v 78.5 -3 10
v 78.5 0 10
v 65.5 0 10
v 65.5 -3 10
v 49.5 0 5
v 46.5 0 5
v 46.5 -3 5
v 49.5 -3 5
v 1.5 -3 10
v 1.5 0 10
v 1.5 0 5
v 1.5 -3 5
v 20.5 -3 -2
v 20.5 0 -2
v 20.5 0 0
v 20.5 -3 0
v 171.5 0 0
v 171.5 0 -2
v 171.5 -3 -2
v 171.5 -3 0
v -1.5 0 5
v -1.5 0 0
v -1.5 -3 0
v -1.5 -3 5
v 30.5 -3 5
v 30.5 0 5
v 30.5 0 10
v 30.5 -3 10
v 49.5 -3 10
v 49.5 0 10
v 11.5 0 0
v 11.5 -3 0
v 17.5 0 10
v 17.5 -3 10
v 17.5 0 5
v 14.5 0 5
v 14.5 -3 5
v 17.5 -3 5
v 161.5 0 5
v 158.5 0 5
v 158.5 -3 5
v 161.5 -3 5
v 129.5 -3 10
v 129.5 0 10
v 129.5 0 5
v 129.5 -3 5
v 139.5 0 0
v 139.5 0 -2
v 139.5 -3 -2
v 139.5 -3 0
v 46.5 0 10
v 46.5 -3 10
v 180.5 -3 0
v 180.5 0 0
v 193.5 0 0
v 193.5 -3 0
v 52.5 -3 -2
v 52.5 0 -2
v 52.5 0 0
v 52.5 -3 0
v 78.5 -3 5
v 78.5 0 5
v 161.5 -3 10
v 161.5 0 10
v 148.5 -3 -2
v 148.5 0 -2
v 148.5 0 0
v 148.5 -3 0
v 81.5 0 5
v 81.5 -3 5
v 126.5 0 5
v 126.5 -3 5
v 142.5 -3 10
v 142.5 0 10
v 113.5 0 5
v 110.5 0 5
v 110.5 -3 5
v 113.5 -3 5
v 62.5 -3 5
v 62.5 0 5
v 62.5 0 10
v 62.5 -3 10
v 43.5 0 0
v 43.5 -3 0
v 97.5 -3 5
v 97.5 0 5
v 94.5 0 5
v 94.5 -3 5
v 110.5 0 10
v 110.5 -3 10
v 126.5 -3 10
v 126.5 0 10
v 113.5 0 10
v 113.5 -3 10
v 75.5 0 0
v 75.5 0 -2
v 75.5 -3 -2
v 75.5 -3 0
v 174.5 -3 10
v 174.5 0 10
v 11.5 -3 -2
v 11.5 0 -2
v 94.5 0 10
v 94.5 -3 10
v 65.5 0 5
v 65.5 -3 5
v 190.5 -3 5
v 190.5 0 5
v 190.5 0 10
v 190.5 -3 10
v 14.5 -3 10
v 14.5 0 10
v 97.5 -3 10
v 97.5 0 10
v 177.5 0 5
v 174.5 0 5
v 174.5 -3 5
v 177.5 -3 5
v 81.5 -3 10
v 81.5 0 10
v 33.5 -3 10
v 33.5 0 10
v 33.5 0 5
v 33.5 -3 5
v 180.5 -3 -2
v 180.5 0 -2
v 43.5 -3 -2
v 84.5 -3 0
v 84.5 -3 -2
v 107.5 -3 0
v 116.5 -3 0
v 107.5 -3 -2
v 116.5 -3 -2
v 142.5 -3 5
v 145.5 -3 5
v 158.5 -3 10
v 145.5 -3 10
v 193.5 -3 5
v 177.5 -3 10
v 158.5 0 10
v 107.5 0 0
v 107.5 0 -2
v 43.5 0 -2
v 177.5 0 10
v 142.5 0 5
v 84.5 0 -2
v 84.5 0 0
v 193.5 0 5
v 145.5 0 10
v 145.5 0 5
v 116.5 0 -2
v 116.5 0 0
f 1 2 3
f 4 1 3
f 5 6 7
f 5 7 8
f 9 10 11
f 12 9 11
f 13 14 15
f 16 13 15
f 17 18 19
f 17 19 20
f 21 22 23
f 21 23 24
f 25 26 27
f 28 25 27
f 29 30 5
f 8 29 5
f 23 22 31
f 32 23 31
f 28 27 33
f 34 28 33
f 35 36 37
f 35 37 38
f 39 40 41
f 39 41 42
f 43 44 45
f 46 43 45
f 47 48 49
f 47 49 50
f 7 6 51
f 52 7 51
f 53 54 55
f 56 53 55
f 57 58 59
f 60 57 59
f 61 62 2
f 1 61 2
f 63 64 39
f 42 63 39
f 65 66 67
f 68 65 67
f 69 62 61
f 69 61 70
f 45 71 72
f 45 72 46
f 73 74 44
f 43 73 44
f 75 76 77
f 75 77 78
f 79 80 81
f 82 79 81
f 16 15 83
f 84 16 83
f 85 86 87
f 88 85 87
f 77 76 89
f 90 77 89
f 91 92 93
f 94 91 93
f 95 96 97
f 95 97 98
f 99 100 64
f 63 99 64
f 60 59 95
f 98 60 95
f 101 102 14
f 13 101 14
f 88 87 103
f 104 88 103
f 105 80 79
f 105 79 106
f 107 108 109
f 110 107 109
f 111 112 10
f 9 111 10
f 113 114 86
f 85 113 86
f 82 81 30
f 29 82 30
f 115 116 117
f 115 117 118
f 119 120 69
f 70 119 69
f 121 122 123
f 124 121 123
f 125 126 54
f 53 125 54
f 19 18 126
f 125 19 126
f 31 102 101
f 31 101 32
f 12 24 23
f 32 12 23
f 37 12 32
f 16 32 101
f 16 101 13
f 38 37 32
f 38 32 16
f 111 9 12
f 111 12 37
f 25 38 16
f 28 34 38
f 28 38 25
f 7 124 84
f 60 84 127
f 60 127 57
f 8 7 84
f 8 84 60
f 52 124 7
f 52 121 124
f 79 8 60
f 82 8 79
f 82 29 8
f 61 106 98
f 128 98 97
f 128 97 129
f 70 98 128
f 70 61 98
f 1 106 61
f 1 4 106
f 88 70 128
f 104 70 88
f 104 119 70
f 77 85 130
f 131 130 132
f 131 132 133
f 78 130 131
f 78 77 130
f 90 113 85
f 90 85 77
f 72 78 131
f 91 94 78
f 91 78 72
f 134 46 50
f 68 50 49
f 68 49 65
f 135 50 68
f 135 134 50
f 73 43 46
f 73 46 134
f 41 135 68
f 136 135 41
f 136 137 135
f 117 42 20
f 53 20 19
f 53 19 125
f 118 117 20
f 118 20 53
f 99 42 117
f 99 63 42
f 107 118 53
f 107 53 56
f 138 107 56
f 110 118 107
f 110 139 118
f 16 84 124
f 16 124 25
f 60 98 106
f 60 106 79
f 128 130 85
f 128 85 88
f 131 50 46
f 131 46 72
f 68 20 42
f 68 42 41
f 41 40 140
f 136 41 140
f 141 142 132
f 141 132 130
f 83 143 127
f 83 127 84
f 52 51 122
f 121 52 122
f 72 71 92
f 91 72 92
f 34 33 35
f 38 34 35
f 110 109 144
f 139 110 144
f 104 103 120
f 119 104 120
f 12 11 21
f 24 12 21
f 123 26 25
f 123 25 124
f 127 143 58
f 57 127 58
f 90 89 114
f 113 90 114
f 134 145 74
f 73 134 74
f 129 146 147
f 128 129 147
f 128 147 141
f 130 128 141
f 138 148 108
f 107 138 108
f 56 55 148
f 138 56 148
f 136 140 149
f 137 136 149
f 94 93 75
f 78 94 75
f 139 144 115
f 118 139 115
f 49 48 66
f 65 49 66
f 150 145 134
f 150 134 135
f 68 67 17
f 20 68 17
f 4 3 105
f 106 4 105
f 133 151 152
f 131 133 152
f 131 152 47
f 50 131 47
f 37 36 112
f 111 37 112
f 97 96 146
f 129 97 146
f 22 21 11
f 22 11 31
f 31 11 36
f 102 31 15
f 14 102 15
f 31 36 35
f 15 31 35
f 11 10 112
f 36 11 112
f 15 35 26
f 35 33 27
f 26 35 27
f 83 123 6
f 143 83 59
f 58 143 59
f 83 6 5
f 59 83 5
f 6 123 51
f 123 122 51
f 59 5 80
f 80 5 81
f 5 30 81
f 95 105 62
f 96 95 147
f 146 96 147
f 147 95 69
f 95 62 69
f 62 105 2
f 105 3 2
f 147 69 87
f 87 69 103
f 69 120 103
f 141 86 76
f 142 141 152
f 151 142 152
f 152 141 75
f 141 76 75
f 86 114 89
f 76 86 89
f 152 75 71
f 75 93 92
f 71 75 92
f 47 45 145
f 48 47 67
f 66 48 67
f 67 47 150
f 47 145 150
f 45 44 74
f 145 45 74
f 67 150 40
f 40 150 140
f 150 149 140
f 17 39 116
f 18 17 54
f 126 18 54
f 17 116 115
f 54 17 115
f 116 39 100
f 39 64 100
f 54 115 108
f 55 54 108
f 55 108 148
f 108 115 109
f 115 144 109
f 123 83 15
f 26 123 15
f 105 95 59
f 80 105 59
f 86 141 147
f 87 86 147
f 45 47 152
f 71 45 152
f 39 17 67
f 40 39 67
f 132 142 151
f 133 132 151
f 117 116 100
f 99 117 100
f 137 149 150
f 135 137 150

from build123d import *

# Parameters (mm, degrees)
F0_W     = 3
F0_H     = 2
F0_W_2   = 1.5
F0_H_2   = 5
F1_DEPTH = 3


with BuildPart() as f1:
    # F0 (on Front) → F1 (new body)
    with BuildSketch(Plane.XZ):
        Polygon((1.5, 5), (1.5, 0), (11.5, 0), (14.5, 0), (14.5, 5), (14.5, 10), (11.5, 10), (1.5, 10), align=None)
        Polygon((17.5, 5), (17.5, 0), (20.5, 0), (30.5, 0), (30.5, 5), (30.5, 10), (20.5, 10), (17.5, 10), align=None)
        with Locations((45, -1)):
            Rectangle(F0_W, F0_H)
        with Locations((51, -1)):
            Rectangle(F0_W, F0_H)
        with Locations((77, -1)):
            Rectangle(F0_W, F0_H)
        with Locations((83, -1)):
            Rectangle(F0_W, F0_H)
        with Locations((109, -1)):
            Rectangle(F0_W, F0_H)
        with Locations((115, -1)):
            Rectangle(F0_W, F0_H)
        with Locations((141, -1)):
            Rectangle(F0_W, F0_H)
        with Locations((147, -1)):
            Rectangle(F0_W, F0_H)
        with Locations((173, -1)):
            Rectangle(F0_W, F0_H)
        with Locations((179, -1)):
            Rectangle(F0_W, F0_H)
        Polygon((33.5, 5), (33.5, 0), (43.5, 0), (46.5, 0), (46.5, 5), (46.5, 10), (33.5, 10), align=None)
        Polygon((49.5, 5), (49.5, 0), (52.5, 0), (62.5, 0), (62.5, 5), (62.5, 10), (49.5, 10), align=None)
        Polygon((78.5, 10), (65.5, 10), (65.5, 5), (65.5, 0), (75.5, 0), (78.5, 0), (78.5, 5), align=None)
        Polygon((94.5, 10), (81.5, 10), (81.5, 5), (81.5, 0), (84.5, 0), (94.5, 0), (94.5, 5), align=None)
        Polygon((110.5, 10), (97.5, 10), (97.5, 5), (97.5, 0), (107.5, 0), (110.5, 0), (110.5, 5), align=None)
        Polygon((126.5, 10), (113.5, 10), (113.5, 5), (113.5, 0), (116.5, 0), (126.5, 0), (126.5, 5), align=None)
        Polygon((142.5, 10), (129.5, 10), (129.5, 5), (129.5, 0), (139.5, 0), (142.5, 0), (142.5, 5), align=None)
        Polygon((158.5, 10), (145.5, 10), (145.5, 5), (145.5, 0), (148.5, 0), (158.5, 0), (158.5, 5), align=None)
        Polygon((171.5, 10), (161.5, 10), (161.5, 5), (161.5, 0), (171.5, 0), (174.5, 0), (174.5, 5), (174.5, 10), align=None)
        Polygon((180.5, 10), (177.5, 10), (177.5, 5), (177.5, 0), (180.5, 0), (190.5, 0), (190.5, 5), (190.5, 10), align=None)
        with Locations((0.75, 2.5)):
            Rectangle(F0_W_2, F0_H_2)
        with Locations((-0.75, 2.5)):
            Rectangle(F0_W_2, F0_H_2)
        with Locations((16, -1)):
            Rectangle(F0_W, F0_H)
        with Locations((16, 2.5)):
            Rectangle(F0_W, F0_H_2)
        with Locations((32, 2.5)):
            Rectangle(F0_W, F0_H_2)
        with Locations((48, -1)):
            Rectangle(F0_W, F0_H)
        with Locations((48, 2.5)):
            Rectangle(F0_W, F0_H_2)
        with Locations((13, -1)):
            Rectangle(F0_W, F0_H)
        with Locations((19, -1)):
            Rectangle(F0_W, F0_H)
        with Locations((64, 2.5)):
            Rectangle(F0_W, F0_H_2)
        with Locations((80, 2.5)):
            Rectangle(F0_W, F0_H_2)
        with Locations((80, -1)):
            Rectangle(F0_W, F0_H)
        with Locations((96.75, 2.5)):
            Rectangle(F0_W_2, F0_H_2)
        with Locations((112, 2.5)):
            Rectangle(F0_W, F0_H_2)
        with Locations((112, -1)):
            Rectangle(F0_W, F0_H)
        with Locations((128, 2.5)):
            Rectangle(F0_W, F0_H_2)
        with Locations((144, 2.5)):
            Rectangle(F0_W, F0_H_2)
        with Locations((144, -1)):
            Rectangle(F0_W, F0_H)
        with Locations((160, 2.5)):
            Rectangle(F0_W, F0_H_2)
        with Locations((95.25, 2.5)):
            Rectangle(F0_W_2, F0_H_2)
        with Locations((176, 2.5)):
            Rectangle(F0_W, F0_H_2)
        with Locations((176, -1)):
            Rectangle(F0_W, F0_H)
        with Locations((191.25, 2.5)):
            Rectangle(F0_W_2, F0_H_2)
        with Locations((192.75, 2.5)):
            Rectangle(F0_W_2, F0_H_2)
    extrude(amount=F1_DEPTH)


solid = f1.part
